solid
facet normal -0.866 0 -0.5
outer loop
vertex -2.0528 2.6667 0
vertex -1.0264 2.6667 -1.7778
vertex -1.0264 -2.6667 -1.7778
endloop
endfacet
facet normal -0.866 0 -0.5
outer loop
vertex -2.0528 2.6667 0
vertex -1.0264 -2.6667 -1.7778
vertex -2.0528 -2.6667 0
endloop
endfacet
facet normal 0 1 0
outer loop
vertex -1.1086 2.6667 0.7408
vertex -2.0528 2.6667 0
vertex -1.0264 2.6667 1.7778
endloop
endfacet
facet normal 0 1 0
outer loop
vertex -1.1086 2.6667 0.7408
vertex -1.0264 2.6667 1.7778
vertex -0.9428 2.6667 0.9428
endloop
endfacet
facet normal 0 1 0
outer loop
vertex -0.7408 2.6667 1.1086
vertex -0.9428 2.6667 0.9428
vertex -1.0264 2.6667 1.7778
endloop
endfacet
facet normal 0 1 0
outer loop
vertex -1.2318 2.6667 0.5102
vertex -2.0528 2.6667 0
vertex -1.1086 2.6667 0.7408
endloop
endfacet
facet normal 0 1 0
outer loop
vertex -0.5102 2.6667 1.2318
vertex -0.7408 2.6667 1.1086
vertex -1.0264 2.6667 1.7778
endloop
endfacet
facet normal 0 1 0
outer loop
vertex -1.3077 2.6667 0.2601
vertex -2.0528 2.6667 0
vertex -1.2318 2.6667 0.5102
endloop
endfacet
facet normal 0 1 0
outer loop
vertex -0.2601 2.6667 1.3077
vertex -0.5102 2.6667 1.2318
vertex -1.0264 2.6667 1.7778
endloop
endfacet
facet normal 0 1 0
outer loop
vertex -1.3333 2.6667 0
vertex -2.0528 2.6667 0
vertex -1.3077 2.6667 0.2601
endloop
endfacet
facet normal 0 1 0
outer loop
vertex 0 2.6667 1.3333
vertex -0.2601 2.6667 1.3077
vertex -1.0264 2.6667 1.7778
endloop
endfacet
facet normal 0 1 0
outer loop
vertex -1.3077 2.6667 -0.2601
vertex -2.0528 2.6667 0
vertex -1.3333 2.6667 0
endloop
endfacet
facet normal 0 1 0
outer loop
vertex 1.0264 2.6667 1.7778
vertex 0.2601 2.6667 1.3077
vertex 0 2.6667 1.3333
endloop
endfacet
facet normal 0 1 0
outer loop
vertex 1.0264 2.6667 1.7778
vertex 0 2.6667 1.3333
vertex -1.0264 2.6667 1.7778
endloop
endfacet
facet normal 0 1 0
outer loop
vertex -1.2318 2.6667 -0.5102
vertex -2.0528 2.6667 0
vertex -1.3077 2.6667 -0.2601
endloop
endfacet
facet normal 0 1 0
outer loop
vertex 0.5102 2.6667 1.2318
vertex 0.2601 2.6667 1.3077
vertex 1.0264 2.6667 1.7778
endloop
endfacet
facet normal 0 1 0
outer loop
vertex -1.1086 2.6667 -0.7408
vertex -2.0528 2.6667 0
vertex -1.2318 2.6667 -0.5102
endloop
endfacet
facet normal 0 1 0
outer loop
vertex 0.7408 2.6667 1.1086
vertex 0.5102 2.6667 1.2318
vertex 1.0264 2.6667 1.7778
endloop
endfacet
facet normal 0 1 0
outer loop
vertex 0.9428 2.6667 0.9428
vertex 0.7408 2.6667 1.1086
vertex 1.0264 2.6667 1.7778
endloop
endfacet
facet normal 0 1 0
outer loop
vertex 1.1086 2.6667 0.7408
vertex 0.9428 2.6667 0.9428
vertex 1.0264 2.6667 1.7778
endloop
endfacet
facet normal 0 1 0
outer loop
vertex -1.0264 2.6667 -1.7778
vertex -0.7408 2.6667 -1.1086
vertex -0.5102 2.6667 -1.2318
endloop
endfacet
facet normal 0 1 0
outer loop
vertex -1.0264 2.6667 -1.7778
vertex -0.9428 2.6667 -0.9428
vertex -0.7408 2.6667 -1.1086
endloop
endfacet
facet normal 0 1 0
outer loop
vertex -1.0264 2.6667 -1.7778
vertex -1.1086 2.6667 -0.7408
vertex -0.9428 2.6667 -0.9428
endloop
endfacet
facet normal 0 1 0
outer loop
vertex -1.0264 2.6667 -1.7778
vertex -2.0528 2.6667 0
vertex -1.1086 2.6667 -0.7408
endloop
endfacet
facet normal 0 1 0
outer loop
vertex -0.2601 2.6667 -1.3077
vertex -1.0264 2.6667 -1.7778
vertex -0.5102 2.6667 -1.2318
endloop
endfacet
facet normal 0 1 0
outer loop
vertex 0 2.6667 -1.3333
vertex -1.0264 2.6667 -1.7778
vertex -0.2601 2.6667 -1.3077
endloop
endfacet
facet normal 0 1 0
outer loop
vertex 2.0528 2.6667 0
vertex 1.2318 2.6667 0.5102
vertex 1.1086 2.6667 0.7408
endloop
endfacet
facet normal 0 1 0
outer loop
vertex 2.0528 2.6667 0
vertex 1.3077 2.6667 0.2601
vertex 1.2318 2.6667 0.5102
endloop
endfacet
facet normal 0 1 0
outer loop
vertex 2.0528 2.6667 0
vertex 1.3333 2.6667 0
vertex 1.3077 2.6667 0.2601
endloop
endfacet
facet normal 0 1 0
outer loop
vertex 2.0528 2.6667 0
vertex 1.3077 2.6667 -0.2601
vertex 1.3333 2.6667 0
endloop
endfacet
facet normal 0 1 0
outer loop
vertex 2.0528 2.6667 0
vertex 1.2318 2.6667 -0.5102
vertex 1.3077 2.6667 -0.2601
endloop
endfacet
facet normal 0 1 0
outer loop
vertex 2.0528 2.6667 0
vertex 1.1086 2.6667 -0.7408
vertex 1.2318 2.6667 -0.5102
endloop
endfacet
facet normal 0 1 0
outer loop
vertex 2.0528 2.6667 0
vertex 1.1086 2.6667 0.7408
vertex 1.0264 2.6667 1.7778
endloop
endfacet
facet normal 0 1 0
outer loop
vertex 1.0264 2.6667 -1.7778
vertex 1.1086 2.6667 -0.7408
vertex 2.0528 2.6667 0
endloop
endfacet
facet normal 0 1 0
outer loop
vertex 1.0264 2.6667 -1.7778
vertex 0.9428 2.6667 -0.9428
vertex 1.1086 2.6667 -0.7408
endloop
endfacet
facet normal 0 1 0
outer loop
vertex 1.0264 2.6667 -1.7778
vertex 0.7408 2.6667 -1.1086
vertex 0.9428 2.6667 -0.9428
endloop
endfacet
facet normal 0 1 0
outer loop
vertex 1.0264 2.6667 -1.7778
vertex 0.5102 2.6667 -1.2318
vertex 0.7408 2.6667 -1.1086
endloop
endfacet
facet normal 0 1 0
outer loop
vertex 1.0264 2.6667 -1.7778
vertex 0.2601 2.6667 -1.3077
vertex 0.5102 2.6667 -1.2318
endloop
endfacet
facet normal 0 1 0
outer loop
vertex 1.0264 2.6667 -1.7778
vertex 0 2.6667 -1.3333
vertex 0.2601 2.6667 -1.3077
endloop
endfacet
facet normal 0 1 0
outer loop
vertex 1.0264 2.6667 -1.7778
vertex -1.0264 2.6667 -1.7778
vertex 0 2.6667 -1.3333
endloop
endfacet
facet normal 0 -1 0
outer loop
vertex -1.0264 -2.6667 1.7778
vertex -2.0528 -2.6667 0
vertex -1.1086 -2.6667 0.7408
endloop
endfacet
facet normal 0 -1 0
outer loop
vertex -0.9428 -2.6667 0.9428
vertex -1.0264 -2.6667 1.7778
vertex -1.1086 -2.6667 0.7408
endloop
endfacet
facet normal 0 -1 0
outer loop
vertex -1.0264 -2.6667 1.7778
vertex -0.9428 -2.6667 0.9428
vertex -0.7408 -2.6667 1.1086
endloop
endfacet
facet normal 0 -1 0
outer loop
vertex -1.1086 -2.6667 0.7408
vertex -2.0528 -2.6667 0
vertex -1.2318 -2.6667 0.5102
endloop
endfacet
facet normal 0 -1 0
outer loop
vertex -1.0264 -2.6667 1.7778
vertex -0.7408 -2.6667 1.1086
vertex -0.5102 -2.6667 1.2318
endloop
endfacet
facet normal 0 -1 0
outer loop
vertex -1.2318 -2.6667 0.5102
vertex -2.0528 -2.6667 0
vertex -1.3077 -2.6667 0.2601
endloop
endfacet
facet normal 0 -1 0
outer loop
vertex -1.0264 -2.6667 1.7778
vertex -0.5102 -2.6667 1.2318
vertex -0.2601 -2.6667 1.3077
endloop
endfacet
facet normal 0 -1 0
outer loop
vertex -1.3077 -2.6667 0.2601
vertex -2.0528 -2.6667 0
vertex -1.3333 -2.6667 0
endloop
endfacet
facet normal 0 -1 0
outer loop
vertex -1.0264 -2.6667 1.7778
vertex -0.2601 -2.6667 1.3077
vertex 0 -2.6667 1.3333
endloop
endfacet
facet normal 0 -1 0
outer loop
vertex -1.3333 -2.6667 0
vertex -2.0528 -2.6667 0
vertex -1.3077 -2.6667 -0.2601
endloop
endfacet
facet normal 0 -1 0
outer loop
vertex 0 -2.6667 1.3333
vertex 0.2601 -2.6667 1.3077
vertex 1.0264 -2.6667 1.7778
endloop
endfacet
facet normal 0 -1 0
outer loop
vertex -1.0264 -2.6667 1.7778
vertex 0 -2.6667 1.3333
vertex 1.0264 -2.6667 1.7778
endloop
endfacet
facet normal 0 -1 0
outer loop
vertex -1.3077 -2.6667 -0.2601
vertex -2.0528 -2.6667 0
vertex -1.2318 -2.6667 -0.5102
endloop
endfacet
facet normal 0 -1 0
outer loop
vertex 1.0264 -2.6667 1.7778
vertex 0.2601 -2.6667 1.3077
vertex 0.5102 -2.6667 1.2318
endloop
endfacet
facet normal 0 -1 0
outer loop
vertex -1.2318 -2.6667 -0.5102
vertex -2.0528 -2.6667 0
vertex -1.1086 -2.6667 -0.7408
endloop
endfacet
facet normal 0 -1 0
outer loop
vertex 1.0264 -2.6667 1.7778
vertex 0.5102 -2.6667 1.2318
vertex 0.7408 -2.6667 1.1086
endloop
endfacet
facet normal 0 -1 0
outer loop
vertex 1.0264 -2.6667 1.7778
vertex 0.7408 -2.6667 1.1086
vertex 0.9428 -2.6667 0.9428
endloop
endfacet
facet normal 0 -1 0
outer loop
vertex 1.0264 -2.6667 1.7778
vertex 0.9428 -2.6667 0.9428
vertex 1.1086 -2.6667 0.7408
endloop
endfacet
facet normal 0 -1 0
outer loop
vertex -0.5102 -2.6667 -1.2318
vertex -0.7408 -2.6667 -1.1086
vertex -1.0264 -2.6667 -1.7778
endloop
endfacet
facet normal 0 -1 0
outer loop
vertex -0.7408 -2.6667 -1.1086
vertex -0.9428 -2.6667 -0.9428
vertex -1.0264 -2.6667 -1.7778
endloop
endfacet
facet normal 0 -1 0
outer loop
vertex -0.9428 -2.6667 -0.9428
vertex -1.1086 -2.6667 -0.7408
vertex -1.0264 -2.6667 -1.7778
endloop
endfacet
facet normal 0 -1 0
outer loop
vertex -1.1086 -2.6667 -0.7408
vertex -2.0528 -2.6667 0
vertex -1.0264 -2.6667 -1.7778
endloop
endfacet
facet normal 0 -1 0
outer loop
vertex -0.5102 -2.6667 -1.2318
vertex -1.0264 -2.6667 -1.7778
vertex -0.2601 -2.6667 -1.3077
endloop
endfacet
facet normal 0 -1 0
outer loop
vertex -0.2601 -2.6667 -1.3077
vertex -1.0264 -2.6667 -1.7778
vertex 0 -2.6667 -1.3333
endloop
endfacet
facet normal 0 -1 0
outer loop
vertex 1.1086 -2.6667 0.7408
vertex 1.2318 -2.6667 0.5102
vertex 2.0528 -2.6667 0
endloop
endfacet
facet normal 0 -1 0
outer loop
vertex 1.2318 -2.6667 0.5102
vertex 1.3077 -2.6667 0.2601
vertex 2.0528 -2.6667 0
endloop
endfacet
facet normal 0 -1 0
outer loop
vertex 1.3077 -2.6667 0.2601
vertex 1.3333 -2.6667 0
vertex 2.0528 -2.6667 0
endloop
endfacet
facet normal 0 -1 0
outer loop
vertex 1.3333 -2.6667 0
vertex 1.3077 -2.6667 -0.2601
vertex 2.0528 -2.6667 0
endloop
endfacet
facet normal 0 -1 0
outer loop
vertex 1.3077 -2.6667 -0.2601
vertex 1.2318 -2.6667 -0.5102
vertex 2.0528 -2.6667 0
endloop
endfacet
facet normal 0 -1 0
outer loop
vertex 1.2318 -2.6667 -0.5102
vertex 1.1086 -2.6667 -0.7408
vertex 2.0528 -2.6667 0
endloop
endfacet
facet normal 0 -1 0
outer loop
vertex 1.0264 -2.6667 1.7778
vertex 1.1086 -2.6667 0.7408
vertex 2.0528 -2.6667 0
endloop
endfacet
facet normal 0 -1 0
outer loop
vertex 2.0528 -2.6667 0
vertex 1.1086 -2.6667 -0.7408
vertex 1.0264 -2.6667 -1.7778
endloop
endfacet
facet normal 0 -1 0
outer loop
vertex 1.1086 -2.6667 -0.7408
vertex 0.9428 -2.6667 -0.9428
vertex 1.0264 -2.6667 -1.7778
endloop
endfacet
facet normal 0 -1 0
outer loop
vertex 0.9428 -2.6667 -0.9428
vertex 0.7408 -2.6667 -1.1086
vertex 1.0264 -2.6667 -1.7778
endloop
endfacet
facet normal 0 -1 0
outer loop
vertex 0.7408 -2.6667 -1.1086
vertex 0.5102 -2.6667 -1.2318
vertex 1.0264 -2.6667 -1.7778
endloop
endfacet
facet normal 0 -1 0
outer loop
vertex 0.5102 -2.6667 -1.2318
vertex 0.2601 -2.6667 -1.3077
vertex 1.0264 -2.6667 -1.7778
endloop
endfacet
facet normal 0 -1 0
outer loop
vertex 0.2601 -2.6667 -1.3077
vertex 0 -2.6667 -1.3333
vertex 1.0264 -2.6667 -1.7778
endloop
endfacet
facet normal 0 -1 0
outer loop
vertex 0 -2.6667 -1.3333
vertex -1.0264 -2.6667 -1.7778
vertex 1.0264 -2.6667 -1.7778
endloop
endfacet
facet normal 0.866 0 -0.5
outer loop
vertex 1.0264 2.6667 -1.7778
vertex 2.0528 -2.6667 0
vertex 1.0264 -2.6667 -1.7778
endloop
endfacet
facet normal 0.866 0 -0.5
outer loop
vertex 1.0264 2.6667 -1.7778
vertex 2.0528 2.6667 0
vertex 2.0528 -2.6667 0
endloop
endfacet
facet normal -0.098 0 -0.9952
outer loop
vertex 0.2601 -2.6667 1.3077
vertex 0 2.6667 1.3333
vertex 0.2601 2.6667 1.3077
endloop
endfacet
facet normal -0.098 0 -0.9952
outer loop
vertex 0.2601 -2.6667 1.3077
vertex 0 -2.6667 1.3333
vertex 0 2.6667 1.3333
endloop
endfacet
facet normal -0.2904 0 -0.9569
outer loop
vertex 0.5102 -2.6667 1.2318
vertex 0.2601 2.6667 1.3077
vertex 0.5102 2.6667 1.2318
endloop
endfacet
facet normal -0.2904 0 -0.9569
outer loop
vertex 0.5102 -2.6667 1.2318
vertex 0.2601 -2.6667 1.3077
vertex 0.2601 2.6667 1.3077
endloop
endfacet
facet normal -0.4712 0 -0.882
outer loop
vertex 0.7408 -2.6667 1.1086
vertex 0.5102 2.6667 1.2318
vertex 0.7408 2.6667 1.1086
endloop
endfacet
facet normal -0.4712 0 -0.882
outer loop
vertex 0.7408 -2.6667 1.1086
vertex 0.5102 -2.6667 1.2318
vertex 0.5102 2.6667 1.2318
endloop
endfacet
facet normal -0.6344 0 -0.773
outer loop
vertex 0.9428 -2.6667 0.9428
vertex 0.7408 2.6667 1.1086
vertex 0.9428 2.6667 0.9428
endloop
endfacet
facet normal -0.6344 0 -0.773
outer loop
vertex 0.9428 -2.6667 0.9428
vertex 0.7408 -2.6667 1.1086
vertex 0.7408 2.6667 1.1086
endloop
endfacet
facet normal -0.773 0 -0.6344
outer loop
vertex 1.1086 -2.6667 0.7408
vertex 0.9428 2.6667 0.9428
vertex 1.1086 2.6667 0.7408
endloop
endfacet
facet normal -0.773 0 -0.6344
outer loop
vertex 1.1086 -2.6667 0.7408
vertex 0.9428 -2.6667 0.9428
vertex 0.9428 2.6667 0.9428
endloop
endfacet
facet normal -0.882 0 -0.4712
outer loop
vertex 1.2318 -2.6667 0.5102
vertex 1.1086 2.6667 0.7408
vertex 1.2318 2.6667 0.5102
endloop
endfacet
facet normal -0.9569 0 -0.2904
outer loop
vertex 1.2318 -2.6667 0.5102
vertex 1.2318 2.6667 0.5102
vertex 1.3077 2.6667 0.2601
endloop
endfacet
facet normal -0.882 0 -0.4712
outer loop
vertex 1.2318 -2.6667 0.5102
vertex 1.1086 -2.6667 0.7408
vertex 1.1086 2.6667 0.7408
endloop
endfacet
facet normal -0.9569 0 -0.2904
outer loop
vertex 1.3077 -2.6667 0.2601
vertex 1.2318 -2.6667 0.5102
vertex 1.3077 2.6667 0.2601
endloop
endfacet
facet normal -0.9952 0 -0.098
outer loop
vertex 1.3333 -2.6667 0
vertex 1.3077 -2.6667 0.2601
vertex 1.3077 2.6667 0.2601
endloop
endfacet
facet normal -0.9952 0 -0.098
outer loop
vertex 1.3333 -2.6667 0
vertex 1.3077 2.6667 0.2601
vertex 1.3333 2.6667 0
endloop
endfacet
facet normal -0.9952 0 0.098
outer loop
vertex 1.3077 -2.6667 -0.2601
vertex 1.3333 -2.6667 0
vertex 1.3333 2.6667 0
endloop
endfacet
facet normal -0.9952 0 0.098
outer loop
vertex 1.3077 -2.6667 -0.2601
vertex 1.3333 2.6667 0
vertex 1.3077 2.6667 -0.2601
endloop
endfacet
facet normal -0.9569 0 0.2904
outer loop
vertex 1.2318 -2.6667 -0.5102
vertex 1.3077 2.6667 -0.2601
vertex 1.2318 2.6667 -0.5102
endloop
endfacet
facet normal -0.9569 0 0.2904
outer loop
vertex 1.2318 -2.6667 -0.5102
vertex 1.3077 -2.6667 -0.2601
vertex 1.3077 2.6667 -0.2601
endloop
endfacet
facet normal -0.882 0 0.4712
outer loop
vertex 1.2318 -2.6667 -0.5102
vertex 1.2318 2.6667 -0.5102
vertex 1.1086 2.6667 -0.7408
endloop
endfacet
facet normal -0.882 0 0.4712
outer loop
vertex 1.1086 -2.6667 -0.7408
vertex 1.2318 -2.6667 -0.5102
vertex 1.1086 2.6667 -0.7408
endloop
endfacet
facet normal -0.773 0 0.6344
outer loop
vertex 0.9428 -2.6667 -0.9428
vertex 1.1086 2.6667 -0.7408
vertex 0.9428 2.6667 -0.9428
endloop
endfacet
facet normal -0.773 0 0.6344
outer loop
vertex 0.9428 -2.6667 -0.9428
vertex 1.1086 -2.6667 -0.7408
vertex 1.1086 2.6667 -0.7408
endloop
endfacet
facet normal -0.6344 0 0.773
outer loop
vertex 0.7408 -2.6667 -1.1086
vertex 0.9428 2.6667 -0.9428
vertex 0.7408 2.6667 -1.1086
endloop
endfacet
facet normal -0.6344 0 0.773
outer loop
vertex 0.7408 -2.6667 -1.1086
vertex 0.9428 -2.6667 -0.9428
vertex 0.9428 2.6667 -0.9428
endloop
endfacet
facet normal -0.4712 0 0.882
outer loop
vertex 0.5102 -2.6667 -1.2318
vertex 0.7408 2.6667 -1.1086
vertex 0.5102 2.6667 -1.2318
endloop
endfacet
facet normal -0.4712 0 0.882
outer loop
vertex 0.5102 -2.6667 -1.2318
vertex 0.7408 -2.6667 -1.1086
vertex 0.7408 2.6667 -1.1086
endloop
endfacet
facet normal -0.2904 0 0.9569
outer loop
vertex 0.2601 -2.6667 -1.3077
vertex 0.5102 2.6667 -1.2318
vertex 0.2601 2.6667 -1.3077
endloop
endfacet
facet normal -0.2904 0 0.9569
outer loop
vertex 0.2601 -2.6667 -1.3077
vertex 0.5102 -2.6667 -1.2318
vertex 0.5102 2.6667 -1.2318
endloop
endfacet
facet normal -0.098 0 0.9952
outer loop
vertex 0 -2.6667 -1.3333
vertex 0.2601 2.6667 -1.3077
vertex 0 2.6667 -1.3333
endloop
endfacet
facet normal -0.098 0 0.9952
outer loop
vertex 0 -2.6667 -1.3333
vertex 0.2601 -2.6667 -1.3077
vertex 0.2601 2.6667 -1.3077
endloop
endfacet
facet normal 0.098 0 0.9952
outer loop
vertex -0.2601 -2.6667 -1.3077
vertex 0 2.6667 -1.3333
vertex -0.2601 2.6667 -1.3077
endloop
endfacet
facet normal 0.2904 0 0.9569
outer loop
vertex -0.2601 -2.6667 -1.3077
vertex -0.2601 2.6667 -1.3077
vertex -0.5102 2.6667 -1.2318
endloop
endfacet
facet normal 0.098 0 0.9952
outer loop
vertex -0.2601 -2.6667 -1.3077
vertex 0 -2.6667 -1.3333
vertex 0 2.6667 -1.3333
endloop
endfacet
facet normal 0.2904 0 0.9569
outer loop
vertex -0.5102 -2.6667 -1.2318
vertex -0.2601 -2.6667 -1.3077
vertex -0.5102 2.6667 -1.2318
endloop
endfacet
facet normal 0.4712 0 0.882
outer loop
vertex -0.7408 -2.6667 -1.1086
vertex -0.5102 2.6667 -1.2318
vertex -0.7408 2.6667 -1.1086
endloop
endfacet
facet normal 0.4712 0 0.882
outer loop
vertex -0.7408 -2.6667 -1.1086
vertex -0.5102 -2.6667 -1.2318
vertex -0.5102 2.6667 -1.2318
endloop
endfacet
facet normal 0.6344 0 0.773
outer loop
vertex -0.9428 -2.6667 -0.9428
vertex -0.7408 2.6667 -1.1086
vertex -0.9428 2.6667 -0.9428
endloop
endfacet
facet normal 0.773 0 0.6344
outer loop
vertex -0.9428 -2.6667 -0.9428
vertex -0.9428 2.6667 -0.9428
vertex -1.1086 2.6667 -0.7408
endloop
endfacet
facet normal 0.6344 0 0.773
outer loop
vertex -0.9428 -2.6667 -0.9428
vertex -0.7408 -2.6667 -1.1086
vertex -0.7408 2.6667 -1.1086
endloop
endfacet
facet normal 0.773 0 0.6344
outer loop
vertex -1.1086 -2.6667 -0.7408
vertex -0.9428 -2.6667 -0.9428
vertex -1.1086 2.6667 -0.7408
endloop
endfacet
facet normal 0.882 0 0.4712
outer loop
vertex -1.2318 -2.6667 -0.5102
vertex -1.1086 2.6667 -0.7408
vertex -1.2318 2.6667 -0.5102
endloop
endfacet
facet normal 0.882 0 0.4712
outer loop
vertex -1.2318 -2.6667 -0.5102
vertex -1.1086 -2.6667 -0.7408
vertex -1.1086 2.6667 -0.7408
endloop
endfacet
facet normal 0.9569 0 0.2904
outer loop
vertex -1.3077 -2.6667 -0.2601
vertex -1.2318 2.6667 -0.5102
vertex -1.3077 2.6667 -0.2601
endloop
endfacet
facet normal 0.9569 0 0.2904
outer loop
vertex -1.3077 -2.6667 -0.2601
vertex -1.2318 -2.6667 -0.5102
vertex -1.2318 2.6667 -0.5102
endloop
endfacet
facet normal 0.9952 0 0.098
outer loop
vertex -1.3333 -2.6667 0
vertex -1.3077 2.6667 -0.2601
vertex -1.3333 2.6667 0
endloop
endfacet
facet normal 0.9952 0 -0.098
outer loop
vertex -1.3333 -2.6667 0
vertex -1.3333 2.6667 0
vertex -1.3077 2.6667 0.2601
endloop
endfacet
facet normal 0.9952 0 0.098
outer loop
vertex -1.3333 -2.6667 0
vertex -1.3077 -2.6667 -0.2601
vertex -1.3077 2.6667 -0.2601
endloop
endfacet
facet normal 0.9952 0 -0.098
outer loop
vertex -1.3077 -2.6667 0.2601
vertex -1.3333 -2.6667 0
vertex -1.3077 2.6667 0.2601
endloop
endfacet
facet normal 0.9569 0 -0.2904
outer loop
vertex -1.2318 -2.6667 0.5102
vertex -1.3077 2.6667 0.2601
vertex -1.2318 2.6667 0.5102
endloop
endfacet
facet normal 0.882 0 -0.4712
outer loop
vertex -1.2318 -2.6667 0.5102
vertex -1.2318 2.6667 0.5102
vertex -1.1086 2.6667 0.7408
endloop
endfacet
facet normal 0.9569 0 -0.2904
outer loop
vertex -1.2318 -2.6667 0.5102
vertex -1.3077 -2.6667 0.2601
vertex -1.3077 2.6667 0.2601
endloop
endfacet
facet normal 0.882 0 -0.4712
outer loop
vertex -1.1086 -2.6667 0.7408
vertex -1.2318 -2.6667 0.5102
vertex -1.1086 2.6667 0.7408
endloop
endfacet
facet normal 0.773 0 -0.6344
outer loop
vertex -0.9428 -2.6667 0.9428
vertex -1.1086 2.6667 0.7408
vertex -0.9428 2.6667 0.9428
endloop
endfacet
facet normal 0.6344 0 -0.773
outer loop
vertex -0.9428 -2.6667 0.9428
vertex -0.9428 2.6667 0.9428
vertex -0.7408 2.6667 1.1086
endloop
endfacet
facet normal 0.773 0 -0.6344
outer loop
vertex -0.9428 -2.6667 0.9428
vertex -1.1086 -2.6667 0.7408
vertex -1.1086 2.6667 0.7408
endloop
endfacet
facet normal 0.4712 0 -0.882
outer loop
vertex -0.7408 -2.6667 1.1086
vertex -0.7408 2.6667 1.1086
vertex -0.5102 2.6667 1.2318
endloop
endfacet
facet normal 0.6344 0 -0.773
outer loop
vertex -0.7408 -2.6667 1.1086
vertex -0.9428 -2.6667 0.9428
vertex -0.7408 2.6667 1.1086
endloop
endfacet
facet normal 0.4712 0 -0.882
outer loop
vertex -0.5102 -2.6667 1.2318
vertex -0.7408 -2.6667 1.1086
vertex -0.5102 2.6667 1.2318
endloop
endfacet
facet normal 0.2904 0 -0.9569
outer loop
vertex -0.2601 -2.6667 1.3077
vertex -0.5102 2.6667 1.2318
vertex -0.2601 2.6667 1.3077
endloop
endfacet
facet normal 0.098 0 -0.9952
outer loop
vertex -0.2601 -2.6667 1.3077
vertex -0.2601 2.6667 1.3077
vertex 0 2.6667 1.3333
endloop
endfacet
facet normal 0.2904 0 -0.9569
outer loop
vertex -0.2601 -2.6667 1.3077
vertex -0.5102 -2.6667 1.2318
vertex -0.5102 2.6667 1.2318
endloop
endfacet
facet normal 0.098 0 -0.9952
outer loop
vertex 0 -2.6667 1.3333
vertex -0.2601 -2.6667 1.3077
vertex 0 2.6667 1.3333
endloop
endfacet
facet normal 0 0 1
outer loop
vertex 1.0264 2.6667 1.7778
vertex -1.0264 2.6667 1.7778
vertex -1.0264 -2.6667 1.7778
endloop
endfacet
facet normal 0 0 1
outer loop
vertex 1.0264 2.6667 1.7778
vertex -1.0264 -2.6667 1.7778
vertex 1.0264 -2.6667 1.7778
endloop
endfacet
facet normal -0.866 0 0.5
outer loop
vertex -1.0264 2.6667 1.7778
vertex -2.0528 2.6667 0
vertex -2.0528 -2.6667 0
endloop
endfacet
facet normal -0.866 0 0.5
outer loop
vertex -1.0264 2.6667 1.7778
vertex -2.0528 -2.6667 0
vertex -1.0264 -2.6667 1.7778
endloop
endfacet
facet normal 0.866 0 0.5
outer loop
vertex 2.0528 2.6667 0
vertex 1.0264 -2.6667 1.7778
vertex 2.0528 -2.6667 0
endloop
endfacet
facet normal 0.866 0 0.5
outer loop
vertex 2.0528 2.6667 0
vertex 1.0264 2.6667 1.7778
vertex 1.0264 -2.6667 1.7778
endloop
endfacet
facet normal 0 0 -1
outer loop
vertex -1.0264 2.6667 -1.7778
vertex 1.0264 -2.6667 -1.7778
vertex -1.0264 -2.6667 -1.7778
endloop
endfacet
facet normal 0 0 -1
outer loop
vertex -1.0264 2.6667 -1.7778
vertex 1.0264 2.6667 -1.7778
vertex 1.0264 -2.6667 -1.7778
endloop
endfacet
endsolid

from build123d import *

# Parameters (mm, degrees)
CROQUIS1_R              = 1.5
SALIENTE_EXTRUIR1_DEPTH = 3
SCALE1_SCALE            = 0.888888889


with BuildPart() as part:
    # Croquis1 → Saliente-Extruir1 (new, symmetric)
    with BuildSketch(Plane(origin=(0, 0, 0), x_dir=(1, 0, 0), z_dir=(0, 1, 0))):
        Polygon((1.154700538, 2), (-1.154700538, 2), (-2.309401077, 0), (-1.154700538, -2), (1.154700538, -2), (2.309401077, 0), align=None)
        with Locations(Location((0, 0, 0), (0, 0, 270))):
            Circle(CROQUIS1_R, mode=Mode.SUBTRACT)
    extrude(amount=SALIENTE_EXTRUIR1_DEPTH, both=True)


with BuildPart() as part_1:
    # Scale1: scaled about (0, 0, 0)
    add(part.part.scale(SCALE1_SCALE))


solid = part_1.part
